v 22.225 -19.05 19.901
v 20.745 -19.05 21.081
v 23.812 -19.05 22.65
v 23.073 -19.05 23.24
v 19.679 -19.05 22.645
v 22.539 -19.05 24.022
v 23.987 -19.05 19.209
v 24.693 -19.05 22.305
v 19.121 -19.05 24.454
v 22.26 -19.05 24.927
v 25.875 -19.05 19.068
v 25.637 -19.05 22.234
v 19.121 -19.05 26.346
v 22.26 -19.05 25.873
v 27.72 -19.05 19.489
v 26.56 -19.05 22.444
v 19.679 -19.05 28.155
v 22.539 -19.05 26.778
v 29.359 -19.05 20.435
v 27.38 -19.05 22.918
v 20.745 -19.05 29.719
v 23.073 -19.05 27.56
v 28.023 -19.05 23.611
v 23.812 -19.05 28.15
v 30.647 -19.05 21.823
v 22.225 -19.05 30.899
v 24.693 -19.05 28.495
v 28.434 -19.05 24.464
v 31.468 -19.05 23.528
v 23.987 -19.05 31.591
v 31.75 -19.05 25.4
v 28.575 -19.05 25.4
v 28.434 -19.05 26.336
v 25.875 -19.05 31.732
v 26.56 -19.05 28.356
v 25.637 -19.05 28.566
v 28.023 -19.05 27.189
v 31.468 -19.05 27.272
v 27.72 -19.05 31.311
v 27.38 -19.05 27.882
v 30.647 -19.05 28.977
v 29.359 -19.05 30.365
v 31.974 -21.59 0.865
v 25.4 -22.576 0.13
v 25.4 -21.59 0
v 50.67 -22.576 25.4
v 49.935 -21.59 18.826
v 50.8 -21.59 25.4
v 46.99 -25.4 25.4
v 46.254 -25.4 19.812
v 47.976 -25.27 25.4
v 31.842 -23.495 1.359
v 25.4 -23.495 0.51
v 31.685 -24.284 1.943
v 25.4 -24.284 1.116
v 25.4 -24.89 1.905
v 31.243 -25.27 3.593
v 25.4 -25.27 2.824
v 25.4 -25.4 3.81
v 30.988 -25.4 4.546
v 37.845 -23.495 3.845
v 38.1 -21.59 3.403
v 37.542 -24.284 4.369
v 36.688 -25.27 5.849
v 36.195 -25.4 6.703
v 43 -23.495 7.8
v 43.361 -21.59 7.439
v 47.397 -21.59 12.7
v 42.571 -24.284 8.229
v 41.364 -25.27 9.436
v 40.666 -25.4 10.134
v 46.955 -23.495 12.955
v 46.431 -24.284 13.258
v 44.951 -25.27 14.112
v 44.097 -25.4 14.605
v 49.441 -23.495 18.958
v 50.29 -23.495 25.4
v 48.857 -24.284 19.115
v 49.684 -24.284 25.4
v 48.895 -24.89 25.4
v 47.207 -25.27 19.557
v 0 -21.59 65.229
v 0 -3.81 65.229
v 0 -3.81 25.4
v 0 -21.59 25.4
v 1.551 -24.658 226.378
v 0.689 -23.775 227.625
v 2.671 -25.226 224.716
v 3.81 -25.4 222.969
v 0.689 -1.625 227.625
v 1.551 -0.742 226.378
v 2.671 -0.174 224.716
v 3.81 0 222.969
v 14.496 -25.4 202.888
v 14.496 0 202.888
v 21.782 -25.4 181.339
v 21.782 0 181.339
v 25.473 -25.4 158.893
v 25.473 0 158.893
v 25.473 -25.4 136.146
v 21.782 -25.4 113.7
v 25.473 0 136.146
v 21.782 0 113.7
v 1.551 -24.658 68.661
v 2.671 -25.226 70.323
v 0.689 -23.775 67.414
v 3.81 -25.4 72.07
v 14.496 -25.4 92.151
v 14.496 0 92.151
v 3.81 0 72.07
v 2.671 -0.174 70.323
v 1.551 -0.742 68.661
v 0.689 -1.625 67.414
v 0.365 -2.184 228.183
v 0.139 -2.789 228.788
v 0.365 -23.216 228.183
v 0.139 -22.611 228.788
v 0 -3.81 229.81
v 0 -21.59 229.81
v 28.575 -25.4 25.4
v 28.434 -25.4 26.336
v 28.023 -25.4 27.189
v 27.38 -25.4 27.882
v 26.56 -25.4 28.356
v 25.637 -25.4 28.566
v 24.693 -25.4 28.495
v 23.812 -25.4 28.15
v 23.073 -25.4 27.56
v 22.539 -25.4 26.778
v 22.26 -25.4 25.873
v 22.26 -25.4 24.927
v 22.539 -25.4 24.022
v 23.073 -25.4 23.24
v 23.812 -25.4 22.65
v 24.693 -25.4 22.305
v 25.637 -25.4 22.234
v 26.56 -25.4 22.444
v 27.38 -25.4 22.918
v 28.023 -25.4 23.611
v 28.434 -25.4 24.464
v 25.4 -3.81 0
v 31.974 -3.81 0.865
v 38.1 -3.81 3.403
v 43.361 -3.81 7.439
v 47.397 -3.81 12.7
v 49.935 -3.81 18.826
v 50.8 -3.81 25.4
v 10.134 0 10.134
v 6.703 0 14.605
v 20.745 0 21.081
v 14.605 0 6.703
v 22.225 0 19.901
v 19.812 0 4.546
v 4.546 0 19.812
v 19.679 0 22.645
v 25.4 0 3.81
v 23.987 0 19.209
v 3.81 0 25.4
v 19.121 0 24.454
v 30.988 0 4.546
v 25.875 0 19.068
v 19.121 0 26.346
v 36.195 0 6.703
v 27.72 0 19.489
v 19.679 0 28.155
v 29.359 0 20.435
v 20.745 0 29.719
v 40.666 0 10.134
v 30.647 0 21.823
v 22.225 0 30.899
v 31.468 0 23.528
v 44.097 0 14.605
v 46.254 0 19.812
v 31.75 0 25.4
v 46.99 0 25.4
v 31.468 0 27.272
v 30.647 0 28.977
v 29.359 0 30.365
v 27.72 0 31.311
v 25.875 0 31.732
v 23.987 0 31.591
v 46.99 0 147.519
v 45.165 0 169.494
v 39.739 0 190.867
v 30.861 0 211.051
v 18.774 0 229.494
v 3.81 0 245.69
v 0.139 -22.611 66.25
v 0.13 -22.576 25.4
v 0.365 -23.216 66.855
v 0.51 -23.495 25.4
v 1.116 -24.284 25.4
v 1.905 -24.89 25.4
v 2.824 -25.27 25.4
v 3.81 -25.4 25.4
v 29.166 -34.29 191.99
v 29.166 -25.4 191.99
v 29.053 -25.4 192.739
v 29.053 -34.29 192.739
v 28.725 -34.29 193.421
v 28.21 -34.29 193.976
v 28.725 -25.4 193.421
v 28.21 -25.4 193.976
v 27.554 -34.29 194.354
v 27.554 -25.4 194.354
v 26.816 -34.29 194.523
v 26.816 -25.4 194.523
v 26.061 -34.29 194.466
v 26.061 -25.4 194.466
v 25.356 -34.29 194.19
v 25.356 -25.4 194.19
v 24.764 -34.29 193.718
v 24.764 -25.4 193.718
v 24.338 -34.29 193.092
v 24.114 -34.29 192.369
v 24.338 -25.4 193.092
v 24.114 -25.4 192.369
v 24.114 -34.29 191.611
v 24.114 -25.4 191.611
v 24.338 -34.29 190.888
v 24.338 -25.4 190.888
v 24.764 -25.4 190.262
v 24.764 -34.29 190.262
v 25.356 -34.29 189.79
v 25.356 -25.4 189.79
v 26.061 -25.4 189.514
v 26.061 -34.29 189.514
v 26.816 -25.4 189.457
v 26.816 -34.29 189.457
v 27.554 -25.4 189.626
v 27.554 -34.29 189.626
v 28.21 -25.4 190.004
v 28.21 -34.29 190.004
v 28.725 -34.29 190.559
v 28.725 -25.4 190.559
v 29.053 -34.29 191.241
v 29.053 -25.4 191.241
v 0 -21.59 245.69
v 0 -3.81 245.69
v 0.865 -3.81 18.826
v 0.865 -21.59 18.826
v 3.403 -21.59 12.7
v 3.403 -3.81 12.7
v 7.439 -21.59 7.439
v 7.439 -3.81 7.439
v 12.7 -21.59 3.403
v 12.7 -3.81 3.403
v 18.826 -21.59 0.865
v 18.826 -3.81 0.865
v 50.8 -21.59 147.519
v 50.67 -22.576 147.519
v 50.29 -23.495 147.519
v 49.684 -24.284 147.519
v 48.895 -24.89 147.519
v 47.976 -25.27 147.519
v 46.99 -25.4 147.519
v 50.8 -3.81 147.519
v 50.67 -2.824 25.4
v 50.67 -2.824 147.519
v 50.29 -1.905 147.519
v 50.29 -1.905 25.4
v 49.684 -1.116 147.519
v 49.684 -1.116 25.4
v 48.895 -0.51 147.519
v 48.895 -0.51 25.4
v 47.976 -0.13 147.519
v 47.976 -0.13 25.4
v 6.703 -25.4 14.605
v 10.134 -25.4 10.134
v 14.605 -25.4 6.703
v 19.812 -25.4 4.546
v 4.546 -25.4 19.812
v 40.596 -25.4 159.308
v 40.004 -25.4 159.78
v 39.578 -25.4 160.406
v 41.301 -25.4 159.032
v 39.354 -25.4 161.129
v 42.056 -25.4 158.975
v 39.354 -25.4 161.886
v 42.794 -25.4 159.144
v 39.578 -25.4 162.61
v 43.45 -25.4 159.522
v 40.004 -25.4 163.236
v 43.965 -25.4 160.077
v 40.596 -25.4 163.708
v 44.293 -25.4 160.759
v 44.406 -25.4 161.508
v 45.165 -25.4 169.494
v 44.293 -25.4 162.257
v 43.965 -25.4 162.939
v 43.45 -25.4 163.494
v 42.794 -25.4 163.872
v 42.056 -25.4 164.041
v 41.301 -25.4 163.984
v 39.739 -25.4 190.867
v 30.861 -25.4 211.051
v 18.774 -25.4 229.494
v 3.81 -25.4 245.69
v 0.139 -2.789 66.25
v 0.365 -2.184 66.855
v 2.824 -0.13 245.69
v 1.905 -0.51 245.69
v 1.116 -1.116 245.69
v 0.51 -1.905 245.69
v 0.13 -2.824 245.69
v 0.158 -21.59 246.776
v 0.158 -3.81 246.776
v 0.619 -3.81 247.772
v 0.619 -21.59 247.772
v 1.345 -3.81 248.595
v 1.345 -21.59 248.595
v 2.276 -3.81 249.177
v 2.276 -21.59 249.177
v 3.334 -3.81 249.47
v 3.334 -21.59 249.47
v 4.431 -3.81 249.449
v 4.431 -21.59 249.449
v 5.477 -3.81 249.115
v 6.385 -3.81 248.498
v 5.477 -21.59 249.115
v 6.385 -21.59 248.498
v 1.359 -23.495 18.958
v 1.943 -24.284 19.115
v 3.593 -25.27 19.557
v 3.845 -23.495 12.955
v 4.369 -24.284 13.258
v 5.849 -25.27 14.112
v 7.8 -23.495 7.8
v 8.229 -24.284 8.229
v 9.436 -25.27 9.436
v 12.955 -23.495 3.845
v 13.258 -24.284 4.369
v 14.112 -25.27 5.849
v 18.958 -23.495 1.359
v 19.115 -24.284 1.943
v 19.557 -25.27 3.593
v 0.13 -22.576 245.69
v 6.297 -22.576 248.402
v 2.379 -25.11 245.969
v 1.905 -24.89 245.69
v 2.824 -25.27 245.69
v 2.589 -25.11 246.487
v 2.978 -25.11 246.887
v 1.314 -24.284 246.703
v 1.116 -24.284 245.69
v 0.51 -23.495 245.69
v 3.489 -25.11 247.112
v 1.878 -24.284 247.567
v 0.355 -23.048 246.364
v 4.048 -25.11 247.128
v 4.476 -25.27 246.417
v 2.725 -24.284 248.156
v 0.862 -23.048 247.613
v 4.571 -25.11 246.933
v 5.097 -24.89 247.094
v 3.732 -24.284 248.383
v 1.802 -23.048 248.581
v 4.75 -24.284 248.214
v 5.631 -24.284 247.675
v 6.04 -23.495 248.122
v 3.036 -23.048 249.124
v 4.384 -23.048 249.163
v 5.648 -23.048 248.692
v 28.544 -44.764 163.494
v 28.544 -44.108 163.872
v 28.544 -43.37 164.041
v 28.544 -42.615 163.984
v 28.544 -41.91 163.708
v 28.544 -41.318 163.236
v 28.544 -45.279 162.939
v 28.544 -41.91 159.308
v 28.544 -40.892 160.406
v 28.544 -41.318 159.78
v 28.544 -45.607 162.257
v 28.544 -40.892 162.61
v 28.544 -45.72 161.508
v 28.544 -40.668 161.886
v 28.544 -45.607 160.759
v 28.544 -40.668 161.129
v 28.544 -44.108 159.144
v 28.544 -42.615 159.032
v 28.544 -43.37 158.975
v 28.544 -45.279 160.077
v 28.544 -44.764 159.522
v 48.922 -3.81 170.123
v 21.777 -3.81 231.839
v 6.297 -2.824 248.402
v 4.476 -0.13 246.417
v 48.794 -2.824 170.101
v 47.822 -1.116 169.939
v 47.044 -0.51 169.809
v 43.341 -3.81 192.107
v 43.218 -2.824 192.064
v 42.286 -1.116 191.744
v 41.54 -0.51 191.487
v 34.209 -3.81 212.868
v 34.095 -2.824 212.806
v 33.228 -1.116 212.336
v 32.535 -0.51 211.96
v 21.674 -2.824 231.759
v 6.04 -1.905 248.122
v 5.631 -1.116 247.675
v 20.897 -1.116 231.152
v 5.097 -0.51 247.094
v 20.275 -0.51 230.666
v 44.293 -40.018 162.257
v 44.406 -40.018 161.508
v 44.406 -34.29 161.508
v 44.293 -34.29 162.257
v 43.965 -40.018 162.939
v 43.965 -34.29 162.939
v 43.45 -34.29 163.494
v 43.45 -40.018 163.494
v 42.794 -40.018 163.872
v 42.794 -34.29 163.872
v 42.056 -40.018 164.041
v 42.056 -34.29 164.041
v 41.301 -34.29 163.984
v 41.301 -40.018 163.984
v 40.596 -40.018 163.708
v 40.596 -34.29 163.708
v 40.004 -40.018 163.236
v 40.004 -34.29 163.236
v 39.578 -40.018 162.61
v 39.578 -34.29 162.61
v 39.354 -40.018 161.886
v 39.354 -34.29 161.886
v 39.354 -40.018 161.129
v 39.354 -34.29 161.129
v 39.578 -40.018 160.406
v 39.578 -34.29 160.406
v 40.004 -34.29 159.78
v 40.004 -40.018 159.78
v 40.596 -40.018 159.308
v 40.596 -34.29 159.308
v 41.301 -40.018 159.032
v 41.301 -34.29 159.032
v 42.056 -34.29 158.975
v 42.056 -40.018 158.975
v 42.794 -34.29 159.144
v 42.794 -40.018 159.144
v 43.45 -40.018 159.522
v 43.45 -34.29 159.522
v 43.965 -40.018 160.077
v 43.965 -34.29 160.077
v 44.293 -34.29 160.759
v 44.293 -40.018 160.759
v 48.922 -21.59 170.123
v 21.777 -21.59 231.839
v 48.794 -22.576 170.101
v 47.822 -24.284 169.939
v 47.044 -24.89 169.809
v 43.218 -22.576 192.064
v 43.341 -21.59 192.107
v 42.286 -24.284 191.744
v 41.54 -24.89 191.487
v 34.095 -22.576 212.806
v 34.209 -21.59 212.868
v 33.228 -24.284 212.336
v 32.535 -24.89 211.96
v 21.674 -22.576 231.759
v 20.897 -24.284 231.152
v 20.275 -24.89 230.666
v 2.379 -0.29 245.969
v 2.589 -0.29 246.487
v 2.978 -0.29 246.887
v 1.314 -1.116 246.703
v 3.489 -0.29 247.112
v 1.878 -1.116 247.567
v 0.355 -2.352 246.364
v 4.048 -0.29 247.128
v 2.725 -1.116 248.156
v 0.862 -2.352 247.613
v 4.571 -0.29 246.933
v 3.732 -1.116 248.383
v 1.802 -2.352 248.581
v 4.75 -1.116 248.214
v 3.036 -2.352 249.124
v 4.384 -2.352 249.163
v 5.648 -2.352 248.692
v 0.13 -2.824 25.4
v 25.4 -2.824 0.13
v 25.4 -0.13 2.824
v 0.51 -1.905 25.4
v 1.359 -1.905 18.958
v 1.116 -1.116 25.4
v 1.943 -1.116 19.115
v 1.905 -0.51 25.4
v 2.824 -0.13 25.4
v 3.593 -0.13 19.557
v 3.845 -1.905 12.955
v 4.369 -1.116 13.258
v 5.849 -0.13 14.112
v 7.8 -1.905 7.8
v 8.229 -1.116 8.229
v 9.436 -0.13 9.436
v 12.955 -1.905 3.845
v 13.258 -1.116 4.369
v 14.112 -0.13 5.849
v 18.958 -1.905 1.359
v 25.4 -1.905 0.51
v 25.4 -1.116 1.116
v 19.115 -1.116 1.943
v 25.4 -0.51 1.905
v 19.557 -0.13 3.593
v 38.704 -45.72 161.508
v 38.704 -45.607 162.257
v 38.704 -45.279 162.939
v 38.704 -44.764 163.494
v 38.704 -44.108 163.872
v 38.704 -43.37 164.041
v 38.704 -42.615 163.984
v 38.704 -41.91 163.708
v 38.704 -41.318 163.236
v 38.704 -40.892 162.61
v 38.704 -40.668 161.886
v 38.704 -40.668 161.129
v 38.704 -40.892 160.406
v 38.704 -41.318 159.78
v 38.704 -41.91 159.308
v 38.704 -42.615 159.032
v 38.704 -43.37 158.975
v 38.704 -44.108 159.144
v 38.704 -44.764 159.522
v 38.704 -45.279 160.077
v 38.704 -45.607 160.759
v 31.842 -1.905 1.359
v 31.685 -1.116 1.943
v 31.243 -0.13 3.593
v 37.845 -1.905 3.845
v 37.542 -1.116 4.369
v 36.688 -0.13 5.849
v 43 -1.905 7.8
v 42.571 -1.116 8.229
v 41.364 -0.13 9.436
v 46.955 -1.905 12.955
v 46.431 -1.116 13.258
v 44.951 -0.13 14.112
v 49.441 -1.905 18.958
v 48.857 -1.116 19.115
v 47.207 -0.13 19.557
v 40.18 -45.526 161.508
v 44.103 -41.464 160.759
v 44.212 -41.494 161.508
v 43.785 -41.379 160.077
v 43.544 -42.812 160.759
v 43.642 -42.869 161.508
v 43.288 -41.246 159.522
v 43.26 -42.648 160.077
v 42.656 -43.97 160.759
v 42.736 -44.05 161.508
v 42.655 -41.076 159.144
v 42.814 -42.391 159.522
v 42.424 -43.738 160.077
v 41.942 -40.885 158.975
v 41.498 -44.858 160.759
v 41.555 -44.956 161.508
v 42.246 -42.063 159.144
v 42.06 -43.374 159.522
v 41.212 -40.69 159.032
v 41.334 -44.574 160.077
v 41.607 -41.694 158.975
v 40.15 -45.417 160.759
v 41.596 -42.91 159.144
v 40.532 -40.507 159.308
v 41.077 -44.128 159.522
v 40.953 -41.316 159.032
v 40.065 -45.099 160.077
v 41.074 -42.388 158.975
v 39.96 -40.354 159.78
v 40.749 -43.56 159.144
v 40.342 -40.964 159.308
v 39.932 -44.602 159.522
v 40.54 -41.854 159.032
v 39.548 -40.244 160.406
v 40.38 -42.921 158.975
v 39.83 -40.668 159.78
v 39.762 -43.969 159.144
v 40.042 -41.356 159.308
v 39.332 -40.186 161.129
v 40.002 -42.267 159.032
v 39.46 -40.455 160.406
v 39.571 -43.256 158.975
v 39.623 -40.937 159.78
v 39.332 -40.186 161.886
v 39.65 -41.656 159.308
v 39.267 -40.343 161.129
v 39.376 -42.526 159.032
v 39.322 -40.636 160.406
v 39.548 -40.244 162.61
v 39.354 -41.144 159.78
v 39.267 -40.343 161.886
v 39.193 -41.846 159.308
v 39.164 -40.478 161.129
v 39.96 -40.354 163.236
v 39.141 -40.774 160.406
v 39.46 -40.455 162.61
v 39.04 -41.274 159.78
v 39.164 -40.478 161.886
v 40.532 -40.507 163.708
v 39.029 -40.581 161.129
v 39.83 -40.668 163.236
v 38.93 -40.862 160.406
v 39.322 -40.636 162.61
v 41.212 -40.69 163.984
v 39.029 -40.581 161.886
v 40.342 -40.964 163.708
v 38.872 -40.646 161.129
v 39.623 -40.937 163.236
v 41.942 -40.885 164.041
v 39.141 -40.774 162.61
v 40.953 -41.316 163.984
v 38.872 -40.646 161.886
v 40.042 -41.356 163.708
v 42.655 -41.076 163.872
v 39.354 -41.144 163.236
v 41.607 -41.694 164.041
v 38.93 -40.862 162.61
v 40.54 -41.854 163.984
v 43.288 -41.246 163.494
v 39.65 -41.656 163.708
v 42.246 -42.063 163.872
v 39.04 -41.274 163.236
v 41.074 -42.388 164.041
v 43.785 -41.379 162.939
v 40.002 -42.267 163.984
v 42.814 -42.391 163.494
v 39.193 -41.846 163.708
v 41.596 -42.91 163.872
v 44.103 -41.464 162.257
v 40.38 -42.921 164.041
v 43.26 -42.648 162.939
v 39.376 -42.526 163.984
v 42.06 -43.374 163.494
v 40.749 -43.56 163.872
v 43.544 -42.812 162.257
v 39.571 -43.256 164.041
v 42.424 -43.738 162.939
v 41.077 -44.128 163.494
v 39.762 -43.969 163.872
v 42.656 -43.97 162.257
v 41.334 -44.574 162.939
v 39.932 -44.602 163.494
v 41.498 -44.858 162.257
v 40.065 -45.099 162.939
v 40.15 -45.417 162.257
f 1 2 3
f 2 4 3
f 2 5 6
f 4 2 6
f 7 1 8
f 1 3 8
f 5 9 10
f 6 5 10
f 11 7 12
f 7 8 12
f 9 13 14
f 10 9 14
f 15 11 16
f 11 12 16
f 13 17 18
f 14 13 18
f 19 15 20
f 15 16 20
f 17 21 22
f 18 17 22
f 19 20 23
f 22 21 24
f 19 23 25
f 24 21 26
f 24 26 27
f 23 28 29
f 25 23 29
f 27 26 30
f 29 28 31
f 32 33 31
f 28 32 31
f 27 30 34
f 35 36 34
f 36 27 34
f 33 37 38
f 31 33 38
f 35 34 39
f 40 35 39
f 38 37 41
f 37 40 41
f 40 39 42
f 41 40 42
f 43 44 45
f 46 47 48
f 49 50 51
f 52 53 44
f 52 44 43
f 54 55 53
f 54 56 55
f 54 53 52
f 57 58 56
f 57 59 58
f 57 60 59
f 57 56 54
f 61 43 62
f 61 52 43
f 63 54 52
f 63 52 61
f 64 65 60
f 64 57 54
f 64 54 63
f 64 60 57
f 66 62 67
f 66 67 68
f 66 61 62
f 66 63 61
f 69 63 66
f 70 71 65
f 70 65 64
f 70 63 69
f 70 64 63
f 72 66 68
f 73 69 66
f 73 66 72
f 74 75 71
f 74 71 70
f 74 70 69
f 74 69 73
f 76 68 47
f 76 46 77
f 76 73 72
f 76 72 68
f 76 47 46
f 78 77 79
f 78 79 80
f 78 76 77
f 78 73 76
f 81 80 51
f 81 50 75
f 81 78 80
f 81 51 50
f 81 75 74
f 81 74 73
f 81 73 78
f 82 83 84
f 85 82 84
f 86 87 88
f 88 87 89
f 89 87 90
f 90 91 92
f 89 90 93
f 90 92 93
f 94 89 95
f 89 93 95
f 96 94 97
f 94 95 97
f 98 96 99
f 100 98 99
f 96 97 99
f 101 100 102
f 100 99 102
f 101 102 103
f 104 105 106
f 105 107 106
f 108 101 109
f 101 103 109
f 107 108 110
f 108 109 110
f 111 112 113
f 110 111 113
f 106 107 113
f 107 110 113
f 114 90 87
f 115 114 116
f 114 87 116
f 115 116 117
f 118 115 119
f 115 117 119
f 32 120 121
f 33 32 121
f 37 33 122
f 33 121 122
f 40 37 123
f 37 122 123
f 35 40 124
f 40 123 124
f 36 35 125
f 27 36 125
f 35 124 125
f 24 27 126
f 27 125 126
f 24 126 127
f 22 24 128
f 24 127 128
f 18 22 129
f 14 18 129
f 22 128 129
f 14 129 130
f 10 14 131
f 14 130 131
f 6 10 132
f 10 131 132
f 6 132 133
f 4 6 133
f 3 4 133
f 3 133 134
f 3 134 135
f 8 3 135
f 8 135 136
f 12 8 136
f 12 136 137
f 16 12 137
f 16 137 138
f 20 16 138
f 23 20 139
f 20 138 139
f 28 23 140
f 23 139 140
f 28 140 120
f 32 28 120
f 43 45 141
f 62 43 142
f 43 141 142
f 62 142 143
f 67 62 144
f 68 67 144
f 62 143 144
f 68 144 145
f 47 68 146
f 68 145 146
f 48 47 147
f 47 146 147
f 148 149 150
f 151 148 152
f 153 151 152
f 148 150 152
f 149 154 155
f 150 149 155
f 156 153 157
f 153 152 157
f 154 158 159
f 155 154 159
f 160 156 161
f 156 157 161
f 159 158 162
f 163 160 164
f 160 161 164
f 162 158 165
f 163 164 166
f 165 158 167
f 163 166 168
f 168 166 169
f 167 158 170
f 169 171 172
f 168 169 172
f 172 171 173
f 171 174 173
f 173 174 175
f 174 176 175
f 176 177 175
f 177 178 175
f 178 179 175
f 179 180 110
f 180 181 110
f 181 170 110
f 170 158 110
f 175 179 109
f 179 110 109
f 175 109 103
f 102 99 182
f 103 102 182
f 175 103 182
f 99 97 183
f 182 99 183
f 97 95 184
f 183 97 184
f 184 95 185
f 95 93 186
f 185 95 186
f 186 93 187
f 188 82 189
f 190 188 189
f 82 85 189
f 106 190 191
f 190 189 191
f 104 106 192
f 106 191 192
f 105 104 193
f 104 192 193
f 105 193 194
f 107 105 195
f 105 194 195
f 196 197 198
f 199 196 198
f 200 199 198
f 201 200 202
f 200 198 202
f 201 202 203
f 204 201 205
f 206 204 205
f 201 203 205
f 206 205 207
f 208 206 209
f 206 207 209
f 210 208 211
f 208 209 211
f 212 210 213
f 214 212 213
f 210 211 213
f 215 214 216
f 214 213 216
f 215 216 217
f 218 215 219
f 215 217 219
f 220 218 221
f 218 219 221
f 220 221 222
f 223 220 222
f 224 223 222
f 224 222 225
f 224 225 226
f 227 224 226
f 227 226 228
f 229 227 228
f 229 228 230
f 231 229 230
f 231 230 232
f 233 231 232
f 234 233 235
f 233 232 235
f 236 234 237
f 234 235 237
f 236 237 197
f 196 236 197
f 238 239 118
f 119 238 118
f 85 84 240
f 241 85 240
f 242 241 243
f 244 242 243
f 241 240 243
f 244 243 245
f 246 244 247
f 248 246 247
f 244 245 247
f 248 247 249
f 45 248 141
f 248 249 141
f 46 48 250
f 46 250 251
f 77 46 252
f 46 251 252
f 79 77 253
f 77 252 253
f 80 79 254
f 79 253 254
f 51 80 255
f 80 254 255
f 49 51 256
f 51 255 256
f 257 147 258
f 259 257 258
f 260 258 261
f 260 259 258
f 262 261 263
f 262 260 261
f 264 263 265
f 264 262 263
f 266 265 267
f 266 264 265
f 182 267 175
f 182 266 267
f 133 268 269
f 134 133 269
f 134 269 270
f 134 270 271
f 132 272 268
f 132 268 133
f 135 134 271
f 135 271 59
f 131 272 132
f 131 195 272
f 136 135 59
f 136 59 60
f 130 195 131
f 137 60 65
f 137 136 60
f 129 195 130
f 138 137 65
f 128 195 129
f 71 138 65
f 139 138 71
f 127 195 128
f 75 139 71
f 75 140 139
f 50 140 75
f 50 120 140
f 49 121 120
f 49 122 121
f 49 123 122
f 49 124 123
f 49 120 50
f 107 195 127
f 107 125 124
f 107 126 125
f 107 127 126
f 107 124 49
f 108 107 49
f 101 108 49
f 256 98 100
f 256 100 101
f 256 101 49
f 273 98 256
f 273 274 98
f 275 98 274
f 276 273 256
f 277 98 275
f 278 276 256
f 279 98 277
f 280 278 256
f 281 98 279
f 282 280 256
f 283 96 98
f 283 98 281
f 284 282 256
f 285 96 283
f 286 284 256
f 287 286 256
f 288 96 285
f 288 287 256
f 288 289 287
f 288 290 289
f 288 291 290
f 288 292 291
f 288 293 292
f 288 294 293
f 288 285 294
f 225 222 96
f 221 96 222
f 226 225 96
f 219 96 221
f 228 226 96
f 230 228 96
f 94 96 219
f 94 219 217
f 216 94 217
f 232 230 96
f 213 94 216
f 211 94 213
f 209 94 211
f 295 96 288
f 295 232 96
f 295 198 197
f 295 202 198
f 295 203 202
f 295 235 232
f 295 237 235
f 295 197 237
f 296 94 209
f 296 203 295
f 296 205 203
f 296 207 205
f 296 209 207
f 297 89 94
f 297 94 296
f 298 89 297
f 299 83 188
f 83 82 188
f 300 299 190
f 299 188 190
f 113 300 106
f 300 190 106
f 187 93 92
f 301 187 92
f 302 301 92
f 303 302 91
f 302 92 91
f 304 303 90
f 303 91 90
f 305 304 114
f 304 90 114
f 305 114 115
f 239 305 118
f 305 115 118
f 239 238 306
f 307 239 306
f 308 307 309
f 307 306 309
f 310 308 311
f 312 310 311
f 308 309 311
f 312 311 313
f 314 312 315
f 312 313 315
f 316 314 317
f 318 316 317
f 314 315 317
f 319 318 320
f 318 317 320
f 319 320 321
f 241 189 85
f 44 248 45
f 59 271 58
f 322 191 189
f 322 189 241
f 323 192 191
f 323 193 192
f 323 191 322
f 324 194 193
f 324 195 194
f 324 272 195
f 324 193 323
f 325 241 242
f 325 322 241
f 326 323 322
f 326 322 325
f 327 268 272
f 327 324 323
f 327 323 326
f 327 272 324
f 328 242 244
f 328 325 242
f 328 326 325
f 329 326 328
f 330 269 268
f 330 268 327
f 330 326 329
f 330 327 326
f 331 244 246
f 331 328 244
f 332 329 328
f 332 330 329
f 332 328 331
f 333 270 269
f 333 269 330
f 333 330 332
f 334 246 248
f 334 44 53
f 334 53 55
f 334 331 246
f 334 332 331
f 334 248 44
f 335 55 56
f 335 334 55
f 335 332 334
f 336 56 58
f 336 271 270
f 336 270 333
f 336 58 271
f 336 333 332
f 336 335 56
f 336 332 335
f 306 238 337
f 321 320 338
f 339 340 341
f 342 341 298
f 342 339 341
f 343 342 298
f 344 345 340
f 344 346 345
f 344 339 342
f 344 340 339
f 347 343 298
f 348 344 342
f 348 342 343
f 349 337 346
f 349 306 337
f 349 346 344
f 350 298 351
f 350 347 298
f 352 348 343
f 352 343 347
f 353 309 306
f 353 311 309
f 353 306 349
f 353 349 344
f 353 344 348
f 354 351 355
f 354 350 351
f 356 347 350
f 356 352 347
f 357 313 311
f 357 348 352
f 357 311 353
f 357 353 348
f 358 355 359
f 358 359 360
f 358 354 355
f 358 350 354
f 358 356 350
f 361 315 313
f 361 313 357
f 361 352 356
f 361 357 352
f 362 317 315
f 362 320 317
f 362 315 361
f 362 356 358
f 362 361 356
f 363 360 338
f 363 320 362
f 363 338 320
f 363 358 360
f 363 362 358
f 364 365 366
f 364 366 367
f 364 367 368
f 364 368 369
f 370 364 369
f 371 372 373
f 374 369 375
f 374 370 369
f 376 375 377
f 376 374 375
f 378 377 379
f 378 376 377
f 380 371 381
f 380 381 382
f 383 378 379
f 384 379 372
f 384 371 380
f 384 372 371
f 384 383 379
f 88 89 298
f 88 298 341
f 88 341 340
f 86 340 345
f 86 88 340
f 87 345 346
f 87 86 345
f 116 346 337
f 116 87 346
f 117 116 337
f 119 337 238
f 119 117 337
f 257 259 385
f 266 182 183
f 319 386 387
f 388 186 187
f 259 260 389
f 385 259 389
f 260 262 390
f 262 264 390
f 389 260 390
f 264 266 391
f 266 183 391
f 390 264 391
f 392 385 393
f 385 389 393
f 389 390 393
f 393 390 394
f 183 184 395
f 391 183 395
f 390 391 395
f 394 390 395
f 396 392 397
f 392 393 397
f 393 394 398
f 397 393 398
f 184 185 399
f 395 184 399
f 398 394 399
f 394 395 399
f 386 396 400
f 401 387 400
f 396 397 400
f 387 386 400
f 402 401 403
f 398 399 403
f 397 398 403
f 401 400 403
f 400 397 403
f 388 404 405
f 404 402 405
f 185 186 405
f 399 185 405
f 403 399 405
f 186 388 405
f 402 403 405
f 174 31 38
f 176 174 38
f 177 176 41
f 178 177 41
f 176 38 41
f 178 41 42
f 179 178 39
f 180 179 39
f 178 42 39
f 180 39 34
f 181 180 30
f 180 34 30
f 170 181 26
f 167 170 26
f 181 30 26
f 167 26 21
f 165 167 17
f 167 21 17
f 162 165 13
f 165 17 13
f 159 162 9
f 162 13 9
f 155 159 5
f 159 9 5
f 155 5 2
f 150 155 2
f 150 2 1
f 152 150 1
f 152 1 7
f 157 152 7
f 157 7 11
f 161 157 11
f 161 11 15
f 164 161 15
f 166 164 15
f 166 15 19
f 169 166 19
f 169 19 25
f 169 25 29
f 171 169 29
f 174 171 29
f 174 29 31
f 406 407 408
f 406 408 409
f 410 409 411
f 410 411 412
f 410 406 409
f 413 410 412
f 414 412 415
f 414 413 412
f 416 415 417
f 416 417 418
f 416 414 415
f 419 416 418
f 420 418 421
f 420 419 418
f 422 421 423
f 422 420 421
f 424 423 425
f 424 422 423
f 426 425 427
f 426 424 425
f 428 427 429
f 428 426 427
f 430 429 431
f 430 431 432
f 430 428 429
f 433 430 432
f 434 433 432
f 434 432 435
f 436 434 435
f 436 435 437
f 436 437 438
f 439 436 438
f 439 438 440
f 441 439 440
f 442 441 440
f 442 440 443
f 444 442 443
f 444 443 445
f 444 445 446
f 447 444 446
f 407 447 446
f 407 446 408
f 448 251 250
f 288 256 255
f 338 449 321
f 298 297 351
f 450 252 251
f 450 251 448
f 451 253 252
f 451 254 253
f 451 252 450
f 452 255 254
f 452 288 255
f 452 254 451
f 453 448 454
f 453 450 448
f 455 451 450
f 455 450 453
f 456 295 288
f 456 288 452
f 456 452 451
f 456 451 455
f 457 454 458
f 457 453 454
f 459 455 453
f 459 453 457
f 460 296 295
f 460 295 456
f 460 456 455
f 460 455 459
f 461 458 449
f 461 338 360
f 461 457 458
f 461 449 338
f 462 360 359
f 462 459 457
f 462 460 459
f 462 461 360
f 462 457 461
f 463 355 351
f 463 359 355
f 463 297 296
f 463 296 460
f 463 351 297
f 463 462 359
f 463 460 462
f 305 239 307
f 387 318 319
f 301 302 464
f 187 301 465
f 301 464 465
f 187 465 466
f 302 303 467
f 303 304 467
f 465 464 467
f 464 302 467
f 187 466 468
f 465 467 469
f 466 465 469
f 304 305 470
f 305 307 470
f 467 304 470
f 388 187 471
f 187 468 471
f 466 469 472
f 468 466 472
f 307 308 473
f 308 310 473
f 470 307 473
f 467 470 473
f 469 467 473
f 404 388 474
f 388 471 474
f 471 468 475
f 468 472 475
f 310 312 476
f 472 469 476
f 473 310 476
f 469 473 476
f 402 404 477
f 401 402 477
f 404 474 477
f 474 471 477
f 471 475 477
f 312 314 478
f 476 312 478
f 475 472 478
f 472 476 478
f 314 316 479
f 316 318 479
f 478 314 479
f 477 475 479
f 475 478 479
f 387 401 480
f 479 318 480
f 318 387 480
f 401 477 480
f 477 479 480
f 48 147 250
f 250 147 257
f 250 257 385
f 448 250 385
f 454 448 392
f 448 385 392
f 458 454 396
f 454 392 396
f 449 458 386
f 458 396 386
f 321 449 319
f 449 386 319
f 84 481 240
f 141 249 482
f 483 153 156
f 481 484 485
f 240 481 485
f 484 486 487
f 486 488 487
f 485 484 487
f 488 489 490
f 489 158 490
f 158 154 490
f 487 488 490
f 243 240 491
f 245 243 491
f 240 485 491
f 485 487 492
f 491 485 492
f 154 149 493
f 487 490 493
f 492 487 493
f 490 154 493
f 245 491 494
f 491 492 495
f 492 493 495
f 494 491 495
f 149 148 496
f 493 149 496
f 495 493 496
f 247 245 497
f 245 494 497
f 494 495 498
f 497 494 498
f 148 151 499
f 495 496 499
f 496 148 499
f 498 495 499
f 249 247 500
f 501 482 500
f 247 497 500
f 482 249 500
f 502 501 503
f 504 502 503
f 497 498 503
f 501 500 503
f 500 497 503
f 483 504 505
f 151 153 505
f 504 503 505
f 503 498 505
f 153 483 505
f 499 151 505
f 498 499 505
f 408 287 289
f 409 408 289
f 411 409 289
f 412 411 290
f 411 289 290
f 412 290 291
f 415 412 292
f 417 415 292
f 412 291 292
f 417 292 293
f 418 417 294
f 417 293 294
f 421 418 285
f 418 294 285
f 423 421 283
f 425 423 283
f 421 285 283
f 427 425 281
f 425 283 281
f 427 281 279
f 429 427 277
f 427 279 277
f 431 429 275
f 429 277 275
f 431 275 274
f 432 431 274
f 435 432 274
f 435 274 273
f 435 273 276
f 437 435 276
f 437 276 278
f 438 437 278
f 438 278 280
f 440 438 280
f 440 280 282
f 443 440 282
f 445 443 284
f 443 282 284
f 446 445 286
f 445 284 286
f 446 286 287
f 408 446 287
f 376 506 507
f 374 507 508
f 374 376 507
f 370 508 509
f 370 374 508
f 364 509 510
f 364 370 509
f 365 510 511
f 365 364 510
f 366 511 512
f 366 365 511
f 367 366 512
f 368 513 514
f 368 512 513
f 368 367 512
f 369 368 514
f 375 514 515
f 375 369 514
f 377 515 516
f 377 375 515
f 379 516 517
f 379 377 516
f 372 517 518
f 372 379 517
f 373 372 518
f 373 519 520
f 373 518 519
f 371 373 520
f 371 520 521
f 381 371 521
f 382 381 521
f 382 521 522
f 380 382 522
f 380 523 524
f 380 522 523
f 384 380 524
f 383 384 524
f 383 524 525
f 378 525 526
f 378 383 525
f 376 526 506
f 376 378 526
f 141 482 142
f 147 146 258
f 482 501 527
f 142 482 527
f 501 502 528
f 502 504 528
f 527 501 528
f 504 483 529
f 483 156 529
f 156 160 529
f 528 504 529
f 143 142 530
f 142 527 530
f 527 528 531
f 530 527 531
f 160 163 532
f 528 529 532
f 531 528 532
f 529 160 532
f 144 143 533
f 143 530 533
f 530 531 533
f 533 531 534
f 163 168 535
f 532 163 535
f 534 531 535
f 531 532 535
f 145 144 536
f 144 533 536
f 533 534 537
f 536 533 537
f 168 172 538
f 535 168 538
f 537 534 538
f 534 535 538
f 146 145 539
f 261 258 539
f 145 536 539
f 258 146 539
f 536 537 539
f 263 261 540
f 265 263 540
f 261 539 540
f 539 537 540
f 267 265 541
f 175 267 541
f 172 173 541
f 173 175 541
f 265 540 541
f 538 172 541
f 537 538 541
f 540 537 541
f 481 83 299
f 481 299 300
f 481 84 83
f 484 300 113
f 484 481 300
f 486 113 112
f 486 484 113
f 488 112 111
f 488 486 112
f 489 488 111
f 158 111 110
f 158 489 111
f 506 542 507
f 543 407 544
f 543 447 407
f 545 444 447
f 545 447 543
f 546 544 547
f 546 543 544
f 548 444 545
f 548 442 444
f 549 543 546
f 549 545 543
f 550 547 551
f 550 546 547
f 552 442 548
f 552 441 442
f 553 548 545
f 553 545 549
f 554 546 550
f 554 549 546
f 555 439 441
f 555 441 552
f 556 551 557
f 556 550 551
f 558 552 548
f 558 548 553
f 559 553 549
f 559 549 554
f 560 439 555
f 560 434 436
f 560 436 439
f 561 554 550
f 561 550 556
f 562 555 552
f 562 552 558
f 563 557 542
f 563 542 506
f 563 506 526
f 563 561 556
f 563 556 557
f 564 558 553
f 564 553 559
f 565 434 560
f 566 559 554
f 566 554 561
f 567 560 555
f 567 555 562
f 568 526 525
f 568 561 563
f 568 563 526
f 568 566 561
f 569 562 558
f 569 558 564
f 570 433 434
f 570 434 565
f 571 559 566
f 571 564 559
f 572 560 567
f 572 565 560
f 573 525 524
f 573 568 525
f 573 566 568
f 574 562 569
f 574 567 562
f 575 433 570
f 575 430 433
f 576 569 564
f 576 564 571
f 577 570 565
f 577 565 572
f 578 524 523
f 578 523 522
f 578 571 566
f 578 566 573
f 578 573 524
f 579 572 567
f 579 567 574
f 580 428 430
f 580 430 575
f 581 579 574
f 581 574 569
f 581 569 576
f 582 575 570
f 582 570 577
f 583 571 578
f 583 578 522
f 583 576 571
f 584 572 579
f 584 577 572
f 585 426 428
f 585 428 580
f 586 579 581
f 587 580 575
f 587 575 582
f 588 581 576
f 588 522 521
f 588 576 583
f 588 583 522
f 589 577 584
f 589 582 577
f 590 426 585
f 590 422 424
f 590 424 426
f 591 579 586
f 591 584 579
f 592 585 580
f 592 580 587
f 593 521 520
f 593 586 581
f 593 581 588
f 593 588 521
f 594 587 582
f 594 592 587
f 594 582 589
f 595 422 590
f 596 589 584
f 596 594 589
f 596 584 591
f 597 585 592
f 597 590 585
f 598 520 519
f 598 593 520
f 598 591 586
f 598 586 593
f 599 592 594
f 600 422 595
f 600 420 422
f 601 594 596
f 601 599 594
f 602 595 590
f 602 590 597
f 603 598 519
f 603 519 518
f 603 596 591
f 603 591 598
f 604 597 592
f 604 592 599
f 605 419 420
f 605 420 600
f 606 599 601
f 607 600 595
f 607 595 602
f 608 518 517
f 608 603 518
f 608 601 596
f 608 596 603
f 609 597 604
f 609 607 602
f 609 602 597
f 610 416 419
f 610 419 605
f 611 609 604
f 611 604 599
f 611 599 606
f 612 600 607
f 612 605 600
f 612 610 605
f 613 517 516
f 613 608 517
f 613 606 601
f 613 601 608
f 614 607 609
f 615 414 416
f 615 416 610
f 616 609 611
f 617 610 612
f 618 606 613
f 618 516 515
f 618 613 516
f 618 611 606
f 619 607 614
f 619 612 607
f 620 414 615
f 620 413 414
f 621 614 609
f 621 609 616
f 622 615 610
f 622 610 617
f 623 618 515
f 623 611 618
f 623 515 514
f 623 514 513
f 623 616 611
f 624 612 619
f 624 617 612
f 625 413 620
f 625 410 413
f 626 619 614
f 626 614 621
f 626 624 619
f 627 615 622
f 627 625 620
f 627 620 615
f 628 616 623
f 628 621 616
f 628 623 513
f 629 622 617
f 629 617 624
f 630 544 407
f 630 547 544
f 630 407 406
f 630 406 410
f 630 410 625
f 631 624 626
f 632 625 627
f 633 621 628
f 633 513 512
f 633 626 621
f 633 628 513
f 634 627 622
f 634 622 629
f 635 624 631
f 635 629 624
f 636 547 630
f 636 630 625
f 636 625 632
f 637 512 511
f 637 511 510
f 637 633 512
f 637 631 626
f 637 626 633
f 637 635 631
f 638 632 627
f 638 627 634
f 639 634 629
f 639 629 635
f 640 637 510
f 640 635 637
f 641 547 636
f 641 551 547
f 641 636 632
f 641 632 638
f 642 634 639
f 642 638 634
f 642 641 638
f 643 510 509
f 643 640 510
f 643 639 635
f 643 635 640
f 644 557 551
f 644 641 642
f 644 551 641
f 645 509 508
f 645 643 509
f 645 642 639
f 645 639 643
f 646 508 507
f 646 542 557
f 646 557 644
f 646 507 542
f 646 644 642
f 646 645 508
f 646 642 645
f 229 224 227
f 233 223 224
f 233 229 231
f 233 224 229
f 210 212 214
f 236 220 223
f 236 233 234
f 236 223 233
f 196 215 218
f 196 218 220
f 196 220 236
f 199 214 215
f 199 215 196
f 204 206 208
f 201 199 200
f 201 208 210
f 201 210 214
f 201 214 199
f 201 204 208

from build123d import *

# Parameters (mm, degrees)
F1_DEPTH  = 25.4
F2_R      = 3.175
F3_DEPTH  = 6.35
F4_R      = 3.81
F5_R      = 2.54
F6_DEPTH  = 8.89
F8_R      = 2.54
F11_R     = 6.35
F12_DEPTH = 25.4


with BuildPart() as f1:
    # F0 (on Front) → F1 (new body)
    with BuildSketch(Plane.XZ):
        with BuildLine():
            Line((0, 66.4387534539), (0, 41.0387534539))
            ThreePointArc((0, 41.0387534539), (37.4494820277, 88.5304728284), (50.8, 147.5193767269))
            ThreePointArc((50.8, 147.5193767269), (37.4494820277, 206.5082806255), (0, 254))
            Line((0, 254), (0, 228.6))
            ThreePointArc((0, 228.6), (25.9369896247, 147.5193767269), (0, 66.4387534539))
        make_face()
        with BuildLine():
            ThreePointArc((0, 25.4), (7.4394877579, 7.4394877579), (25.4, 0))
            ThreePointArc((25.4, 0), (43.3605122421, 7.4394877579), (50.8, 25.4))
            Line((50.8, 25.4), (50.8, 147.5193767269))
            ThreePointArc((50.8, 147.5193767269), (37.4494820277, 88.5304728284), (0, 41.0387534539))
            Line((0, 41.0387534539), (0, 25.4))
        make_face()
    extrude(amount=F1_DEPTH)

    # F2 (on face) → F3 (cut)
    with BuildSketch(Plane.XZ.offset(25.4)):
        with Locations((25.4, 25.4)):
            Circle(F2_R)
    extrude(amount=-F3_DEPTH, mode=Mode.SUBTRACT)

    # F4
    f4_edges = [f1.edges().sort_by_distance(p)[0] for p in [
        (0, -12.7, 254),
        (0, -12.7, 228.6),
        (0, 0, 241.3),
        (0, -25.4, 241.3),
        (0, -12.7, 66.438753),
        (0, -12.7, 25.4),
        (0, 0, 45.919377),
        (0, -25.4, 45.919377),
    ]]
    fillet(f4_edges, radius=F4_R)

    # F5 (on face) → F6 (join)
    with BuildSketch(Plane.XZ.offset(25.4)):
        with Locations((26.6260020435, 191.9900625944)):
            Circle(F5_R)
        with Locations((41.8660020435, 161.5079194307)):
            Circle(F5_R)
    extrude(amount=F6_DEPTH)

    # F10: sweep along a path in F9
    with BuildLine(Plane.XY.offset(161.507932)) as f10_path:
        Line((41.8660020435, -34.29), (41.8660020435, -40.0177))
        ThreePointArc((41.8660020435, -40.0177), (40.9397858176, -42.2537837741), (38.7037020435, -43.18))
        Line((38.7037020435, -43.18), (28.5437020435, -43.18))
    # F8 (on face) → F10 (sweep)
    with BuildSketch(Plane.XZ.offset(34.29)):
        with Locations((41.8660020435, 161.5079194307)):
            Circle(F8_R)
    sweep(path=f10_path.line)

    # F11 (on face) → F12 (cut)
    with BuildSketch(Plane.XZ.offset(19.05)):
        with Locations((25.4, 25.4)):
            Circle(F11_R)
    extrude(amount=-F12_DEPTH, mode=Mode.SUBTRACT)


solid = f1.part
